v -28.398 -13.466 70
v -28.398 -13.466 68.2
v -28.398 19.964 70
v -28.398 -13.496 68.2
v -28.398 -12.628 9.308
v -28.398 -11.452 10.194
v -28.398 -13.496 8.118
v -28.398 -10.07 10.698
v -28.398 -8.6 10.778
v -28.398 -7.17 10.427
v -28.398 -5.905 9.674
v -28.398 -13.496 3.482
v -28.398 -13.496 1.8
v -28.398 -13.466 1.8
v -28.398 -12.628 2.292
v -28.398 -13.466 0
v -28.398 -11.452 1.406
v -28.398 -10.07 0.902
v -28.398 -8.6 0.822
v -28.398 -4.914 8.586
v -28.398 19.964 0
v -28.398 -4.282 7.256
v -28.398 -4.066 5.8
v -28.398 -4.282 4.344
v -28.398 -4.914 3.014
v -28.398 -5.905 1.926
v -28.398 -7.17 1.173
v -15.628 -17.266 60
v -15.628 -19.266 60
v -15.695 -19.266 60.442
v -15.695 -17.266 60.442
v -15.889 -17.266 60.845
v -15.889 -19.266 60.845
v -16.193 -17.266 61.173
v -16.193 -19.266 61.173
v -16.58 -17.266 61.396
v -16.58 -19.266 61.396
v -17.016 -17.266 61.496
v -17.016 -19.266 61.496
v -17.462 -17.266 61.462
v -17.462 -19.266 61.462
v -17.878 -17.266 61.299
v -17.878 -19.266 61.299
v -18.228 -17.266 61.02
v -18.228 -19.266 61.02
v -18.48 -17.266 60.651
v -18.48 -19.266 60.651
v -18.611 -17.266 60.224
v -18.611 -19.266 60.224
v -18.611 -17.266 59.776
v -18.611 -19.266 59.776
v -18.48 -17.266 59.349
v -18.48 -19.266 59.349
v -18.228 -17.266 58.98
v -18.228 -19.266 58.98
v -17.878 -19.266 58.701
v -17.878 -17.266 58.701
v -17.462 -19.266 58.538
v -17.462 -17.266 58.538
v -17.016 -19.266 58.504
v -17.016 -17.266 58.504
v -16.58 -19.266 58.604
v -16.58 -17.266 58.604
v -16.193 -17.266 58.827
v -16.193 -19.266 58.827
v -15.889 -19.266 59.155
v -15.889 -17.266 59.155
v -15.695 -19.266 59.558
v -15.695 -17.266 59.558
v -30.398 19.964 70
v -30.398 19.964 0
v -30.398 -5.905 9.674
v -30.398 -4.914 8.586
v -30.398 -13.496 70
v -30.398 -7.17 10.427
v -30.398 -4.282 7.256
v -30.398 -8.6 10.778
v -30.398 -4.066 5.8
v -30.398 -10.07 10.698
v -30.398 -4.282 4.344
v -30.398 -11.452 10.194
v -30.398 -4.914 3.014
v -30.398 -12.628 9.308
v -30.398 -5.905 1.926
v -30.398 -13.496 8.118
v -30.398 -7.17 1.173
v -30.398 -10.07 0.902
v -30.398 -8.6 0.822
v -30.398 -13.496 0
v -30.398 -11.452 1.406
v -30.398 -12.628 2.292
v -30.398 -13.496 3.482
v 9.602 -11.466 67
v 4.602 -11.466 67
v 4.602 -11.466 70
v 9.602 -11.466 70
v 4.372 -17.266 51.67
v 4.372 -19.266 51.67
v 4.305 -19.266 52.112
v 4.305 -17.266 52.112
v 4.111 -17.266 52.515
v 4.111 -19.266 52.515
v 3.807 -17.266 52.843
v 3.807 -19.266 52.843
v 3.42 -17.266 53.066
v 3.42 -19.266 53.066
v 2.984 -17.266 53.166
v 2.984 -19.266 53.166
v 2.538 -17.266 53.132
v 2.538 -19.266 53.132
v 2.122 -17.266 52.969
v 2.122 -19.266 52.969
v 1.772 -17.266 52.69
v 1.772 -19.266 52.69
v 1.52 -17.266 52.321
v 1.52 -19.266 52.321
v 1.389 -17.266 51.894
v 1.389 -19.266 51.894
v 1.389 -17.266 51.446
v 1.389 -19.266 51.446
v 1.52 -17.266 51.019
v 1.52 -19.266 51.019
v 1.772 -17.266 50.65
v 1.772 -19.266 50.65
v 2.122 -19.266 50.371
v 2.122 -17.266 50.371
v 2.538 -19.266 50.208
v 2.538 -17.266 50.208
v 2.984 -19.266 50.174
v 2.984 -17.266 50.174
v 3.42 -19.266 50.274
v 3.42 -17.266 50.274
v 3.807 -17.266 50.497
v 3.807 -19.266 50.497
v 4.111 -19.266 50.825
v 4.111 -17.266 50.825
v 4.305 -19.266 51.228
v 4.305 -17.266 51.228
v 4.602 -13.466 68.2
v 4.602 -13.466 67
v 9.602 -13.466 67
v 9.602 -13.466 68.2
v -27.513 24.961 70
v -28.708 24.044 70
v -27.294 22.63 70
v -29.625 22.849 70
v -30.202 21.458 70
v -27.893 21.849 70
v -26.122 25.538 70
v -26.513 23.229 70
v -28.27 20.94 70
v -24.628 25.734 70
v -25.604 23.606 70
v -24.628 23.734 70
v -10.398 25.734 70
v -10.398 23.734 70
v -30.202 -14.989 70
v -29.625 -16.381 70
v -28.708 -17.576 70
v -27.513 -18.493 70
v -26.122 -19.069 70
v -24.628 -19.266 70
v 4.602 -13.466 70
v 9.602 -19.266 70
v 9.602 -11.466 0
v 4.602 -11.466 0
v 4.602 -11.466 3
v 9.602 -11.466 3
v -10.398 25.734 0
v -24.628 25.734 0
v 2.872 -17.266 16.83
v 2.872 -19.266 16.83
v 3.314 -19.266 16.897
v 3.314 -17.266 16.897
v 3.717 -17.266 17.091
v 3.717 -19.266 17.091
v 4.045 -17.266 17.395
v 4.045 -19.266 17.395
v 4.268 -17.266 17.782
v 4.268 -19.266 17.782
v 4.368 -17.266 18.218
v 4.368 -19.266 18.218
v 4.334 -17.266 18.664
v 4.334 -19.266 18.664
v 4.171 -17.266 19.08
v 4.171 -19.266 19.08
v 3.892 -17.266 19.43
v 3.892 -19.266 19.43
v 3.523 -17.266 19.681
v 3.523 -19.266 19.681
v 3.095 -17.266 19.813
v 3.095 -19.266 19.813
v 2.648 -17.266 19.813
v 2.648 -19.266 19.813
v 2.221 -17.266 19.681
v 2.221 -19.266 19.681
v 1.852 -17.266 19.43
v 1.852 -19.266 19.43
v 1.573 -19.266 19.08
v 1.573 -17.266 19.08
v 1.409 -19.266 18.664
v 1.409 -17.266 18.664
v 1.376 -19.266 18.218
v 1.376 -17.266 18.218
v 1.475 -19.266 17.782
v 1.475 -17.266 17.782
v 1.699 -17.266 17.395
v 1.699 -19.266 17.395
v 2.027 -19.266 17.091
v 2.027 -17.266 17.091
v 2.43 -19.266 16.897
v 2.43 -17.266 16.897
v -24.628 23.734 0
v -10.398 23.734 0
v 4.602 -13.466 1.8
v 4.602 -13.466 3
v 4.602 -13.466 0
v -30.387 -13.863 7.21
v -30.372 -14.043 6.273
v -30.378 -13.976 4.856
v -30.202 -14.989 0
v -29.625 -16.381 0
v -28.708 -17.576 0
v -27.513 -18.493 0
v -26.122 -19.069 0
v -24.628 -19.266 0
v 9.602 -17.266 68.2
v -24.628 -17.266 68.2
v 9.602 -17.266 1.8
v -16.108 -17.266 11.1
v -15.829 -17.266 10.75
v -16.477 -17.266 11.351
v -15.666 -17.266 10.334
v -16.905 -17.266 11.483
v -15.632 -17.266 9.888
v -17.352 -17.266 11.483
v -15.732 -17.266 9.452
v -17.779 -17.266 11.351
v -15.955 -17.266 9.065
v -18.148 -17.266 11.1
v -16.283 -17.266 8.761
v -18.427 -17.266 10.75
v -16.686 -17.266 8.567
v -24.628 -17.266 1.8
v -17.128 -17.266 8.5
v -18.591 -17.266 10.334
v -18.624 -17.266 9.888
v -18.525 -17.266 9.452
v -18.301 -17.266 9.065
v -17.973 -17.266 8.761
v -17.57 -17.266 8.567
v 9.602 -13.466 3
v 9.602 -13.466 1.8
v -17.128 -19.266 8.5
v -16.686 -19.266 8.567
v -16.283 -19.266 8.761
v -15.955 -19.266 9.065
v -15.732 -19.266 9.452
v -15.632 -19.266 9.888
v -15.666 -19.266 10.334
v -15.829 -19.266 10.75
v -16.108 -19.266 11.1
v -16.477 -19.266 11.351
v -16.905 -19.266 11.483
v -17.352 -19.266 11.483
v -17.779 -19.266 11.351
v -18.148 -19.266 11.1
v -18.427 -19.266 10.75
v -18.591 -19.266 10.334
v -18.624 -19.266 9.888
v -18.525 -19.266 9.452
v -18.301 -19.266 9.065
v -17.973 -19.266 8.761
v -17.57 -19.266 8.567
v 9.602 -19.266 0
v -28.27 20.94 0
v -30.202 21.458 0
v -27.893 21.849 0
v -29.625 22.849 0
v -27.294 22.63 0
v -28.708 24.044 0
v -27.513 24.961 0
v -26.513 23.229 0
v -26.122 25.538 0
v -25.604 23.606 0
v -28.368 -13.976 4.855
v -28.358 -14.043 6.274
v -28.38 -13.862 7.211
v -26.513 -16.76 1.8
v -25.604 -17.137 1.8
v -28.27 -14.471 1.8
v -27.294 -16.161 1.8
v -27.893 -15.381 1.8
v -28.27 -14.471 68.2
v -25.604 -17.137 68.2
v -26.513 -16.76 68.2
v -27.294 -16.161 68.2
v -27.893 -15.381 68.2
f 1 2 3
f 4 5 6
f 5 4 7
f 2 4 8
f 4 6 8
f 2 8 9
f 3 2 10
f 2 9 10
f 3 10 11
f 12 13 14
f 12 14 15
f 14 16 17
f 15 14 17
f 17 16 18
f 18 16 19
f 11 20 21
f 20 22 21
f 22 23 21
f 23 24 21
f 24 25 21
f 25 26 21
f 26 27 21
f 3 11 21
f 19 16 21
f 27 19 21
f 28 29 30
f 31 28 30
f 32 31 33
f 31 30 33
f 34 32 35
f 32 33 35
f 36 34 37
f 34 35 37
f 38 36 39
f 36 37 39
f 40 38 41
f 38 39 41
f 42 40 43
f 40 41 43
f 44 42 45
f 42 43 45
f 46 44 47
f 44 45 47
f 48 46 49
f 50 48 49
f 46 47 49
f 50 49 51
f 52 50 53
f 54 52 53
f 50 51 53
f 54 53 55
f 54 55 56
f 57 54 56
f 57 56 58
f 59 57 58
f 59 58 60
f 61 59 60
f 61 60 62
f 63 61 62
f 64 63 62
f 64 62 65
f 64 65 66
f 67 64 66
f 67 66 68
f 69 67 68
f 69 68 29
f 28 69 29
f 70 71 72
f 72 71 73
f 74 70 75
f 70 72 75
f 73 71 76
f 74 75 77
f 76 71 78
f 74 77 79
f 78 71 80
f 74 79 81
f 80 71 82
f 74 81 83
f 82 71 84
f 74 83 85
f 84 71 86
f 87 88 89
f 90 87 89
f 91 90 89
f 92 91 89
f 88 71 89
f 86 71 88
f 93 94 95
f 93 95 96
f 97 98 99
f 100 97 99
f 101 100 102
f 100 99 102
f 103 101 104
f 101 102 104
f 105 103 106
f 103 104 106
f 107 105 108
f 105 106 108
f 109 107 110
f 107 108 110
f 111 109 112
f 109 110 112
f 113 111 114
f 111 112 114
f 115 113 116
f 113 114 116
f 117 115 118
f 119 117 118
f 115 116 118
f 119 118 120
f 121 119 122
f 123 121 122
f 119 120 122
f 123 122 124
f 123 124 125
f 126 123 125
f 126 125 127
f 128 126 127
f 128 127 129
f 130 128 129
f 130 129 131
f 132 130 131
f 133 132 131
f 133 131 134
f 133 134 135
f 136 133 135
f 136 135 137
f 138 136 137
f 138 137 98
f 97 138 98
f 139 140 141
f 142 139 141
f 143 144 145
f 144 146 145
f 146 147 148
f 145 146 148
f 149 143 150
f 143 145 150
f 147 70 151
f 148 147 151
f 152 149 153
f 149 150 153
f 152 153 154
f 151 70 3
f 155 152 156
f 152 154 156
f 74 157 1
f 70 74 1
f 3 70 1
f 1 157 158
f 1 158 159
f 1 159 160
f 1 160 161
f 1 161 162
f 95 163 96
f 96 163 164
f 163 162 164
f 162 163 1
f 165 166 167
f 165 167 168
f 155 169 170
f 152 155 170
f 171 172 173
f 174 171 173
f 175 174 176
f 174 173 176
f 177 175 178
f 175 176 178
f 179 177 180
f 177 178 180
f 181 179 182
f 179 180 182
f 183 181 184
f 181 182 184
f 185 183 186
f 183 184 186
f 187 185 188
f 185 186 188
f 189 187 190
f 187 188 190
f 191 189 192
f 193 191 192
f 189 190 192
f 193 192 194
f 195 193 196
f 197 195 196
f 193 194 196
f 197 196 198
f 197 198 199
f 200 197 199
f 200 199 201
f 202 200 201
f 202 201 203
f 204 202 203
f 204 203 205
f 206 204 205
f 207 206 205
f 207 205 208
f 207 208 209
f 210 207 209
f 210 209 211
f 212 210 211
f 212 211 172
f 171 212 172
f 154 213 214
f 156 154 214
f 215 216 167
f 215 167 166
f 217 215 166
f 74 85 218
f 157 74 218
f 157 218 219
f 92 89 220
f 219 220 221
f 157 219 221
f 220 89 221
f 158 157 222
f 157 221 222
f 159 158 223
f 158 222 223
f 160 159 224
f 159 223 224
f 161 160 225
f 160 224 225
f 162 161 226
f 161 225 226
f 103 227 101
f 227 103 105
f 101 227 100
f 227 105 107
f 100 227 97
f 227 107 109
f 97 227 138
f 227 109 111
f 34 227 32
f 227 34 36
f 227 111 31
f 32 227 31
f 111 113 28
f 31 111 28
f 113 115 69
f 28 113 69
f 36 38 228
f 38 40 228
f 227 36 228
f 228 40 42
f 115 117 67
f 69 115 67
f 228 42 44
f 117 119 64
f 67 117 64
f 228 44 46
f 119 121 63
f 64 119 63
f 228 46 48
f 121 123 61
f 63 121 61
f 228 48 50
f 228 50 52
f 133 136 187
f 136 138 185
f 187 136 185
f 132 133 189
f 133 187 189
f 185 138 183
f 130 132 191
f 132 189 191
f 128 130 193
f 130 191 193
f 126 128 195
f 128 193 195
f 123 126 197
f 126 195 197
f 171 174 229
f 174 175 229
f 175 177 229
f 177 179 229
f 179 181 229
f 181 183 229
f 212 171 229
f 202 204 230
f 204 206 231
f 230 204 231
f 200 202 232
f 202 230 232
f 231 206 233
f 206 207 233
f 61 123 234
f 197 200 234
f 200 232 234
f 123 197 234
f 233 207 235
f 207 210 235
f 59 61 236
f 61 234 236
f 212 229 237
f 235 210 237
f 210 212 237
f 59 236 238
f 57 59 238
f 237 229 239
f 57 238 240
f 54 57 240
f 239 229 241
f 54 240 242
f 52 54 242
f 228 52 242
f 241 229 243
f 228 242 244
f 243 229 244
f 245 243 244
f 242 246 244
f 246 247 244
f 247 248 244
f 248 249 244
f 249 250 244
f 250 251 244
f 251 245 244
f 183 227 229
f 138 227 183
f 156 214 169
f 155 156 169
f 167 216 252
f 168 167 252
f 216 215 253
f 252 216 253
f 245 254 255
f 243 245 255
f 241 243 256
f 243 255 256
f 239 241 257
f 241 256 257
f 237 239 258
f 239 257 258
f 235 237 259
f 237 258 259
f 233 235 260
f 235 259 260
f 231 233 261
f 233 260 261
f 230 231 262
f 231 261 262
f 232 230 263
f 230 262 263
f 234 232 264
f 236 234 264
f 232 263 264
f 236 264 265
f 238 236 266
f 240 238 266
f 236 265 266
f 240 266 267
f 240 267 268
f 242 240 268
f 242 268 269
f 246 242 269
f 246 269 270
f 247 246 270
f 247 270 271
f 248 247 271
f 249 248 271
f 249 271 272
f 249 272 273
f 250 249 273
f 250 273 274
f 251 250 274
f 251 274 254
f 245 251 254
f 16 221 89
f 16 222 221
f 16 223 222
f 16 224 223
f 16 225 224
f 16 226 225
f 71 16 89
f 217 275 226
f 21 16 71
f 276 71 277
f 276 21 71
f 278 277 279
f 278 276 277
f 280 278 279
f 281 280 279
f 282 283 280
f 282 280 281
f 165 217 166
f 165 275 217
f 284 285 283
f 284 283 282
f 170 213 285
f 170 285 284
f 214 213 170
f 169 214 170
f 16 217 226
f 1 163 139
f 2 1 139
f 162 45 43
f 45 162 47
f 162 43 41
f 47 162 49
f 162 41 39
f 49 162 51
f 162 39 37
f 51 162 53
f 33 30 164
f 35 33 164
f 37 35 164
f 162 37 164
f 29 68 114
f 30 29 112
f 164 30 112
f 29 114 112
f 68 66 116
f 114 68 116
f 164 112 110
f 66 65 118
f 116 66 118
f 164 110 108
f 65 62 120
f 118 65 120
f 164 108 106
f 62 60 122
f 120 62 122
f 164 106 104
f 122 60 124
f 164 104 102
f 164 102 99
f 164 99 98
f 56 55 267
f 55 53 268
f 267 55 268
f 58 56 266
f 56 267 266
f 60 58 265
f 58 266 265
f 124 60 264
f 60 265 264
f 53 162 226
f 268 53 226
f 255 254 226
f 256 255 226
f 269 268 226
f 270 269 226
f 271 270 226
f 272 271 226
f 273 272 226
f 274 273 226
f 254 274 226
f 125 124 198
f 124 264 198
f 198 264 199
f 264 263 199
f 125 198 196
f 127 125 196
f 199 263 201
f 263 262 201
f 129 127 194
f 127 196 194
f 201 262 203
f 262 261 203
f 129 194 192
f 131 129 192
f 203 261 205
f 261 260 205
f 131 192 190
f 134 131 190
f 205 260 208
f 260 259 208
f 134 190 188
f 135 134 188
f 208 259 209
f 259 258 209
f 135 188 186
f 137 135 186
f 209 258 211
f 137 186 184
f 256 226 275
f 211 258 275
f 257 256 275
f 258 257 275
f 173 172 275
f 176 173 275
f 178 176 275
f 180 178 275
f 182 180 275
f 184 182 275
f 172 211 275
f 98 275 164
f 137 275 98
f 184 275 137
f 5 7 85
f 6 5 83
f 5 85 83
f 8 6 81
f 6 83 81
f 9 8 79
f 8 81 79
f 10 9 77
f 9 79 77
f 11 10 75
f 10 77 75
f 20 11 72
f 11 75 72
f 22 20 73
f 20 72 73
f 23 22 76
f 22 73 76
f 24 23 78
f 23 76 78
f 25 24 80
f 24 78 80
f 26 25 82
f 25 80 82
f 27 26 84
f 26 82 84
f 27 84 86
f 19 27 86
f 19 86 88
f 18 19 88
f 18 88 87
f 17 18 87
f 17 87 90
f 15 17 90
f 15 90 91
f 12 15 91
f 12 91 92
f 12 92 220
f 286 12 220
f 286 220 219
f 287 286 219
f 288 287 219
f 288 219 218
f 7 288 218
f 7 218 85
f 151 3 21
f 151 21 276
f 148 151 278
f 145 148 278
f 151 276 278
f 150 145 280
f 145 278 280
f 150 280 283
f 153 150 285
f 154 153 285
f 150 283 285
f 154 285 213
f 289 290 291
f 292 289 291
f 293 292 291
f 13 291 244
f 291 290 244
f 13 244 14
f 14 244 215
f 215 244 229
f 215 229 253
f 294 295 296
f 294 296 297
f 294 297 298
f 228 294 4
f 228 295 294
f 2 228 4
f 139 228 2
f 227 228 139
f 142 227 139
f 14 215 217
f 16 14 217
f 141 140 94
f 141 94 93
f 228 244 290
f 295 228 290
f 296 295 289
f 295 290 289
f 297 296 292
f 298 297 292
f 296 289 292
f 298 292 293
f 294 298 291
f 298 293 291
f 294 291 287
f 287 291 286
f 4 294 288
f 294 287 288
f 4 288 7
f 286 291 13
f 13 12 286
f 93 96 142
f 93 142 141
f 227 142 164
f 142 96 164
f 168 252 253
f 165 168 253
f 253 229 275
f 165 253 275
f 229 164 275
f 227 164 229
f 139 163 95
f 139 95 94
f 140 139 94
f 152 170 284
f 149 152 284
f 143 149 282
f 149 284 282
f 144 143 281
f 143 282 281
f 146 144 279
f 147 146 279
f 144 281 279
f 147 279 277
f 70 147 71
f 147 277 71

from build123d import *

# Parameters (mm, degrees)
BOSS_EXTRUDE1_DEPTH = 70
BOSS_EXTRUDE3_REACH = 86.63
SKETCH3_W           = 1.8
SKETCH3_H           = 3.8
SKETCH4_W           = 5
SKETCH4_H           = 3
BOSS_EXTRUDE4_DEPTH = 2
CUT_EXTRUDE1_REACH  = 90.595
SKETCH5_R           = 1.5
CUT_EXTRUDE2_REACH  = 86.63
SKETCH6_R           = 5


with BuildPart() as part:
    # Sketch1 → Boss-Extrude1 (new body)
    with BuildSketch(Plane.XY):
        with BuildLine():
            Line((-30.398230088, 19.964424779), (-30.398230088, -13.495575221))
            ThreePointArc((-30.398230088, -13.495575221), (-28.708236216, -17.575581349), (-24.628230088, -19.265575221))
            Line((-24.628230088, -19.265575221), (9.601769912, -19.265575221))
            Line((9.601769912, -19.265575221), (9.601769912, -17.265575221))
            Line((9.601769912, -17.265575221), (-24.628230088, -17.265575221))
            ThreePointArc((-24.628230088, -17.265575221), (-27.294022654, -16.161367786), (-28.398230088, -13.495575221))
            Line((-28.398230088, -13.495575221), (-28.398230088, 19.964424779))
            ThreePointArc((-28.398230088, 19.964424779), (-27.294022654, 22.630217344), (-24.628230088, 23.734424779))
            Line((-24.628230088, 23.734424779), (-10.398230088, 23.734424779))
            Line((-10.398230088, 23.734424779), (-10.398230088, 25.734424779))
            Line((-10.398230088, 25.734424779), (-24.628230088, 25.734424779))
            ThreePointArc((-24.628230088, 25.734424779), (-28.708236216, 24.044430906), (-30.398230088, 19.964424779))
        make_face()
    extrude(amount=BOSS_EXTRUDE1_DEPTH)

    # Sketch3 → Boss-Extrude3 (add, up to next)
    with BuildSketch(Plane(origin=(9.601769912, 0, 0), x_dir=(0, 0, -1), z_dir=(1, 0, 0)), mode=Mode.PRIVATE) as boss_extrude3_sk1:
        with Locations((-69.1, -15.365575221)):
            Rectangle(SKETCH3_W, SKETCH3_H)
    boss_extrude3_tool1 = extrude(boss_extrude3_sk1.sketch, amount=-BOSS_EXTRUDE3_REACH, mode=Mode.PRIVATE) - part.part
    # Sketch3 → Boss-Extrude3 (add, up to next)
    with BuildSketch(Plane(origin=(9.601769912, 0, 0), x_dir=(0, 0, -1), z_dir=(1, 0, 0)), mode=Mode.PRIVATE) as boss_extrude3_sk2:
        with Locations((-0.9, -15.365575221)):
            Rectangle(SKETCH3_W, SKETCH3_H)
    boss_extrude3_tool2 = extrude(boss_extrude3_sk2.sketch, amount=-BOSS_EXTRUDE3_REACH, mode=Mode.PRIVATE) - part.part
    add(boss_extrude3_tool1.solids().sort_by_distance((9.60177, -15.365575, 69.1))[0])
    add(boss_extrude3_tool2.solids().sort_by_distance((9.60177, -15.365575, 0.9))[0])

    # Sketch4 → Boss-Extrude4 (add)
    with BuildSketch(Plane(origin=(0, -13.465575221, 0), x_dir=(1, 0, 0), z_dir=(0, 1, 0))):
        with Locations((7.101769912, -68.5)):
            Rectangle(SKETCH4_W, SKETCH4_H)
        with Locations((7.101769912, -1.5)):
            Rectangle(SKETCH4_W, SKETCH4_H)
    extrude(amount=BOSS_EXTRUDE4_DEPTH)

    # Sketch5 → Cut-Extrude1 (cut, up to next)
    with BuildSketch(Plane(origin=(0, -19.265575221, 0), x_dir=(-1, 0, 0), z_dir=(0, -1, 0)), mode=Mode.PRIVATE) as cut_extrude1_sk1:
        with Locations(Location((17.128230088, -60, 0), (0, 0, 180))):
            Circle(SKETCH5_R)
    cut_extrude1_tool1 = extrude(cut_extrude1_sk1.sketch, amount=-CUT_EXTRUDE1_REACH, mode=Mode.PRIVATE) & part.part
    # Sketch5 → Cut-Extrude1 (cut, up to next)
    with BuildSketch(Plane(origin=(0, -19.265575221, 0), x_dir=(-1, 0, 0), z_dir=(0, -1, 0)), mode=Mode.PRIVATE) as cut_extrude1_sk2:
        with Locations(Location((17.128230088, -10, 0), (0, 0, 90))):
            Circle(SKETCH5_R)
    cut_extrude1_tool2 = extrude(cut_extrude1_sk2.sketch, amount=-CUT_EXTRUDE1_REACH, mode=Mode.PRIVATE) & part.part
    # Sketch5 → Cut-Extrude1 (cut, up to next)
    with BuildSketch(Plane(origin=(0, -19.265575221, 0), x_dir=(-1, 0, 0), z_dir=(0, -1, 0)), mode=Mode.PRIVATE) as cut_extrude1_sk3:
        with Locations(Location((-2.871769912, -51.67, 0), (0, 0, 180))):
            Circle(SKETCH5_R)
    cut_extrude1_tool3 = extrude(cut_extrude1_sk3.sketch, amount=-CUT_EXTRUDE1_REACH, mode=Mode.PRIVATE) & part.part
    # Sketch5 → Cut-Extrude1 (cut, up to next)
    with BuildSketch(Plane(origin=(0, -19.265575221, 0), x_dir=(-1, 0, 0), z_dir=(0, -1, 0)), mode=Mode.PRIVATE) as cut_extrude1_sk4:
        with Locations(Location((-2.871769912, -18.33, 0), (0, 0, 90))):
            Circle(SKETCH5_R)
    cut_extrude1_tool4 = extrude(cut_extrude1_sk4.sketch, amount=-CUT_EXTRUDE1_REACH, mode=Mode.PRIVATE) & part.part
    add(cut_extrude1_tool1.solids().sort_by_distance((-17.12823, -19.265575, 60))[0], mode=Mode.SUBTRACT)
    add(cut_extrude1_tool2.solids().sort_by_distance((-17.12823, -19.265575, 10))[0], mode=Mode.SUBTRACT)
    add(cut_extrude1_tool3.solids().sort_by_distance((2.87177, -19.265575, 51.67))[0], mode=Mode.SUBTRACT)
    add(cut_extrude1_tool4.solids().sort_by_distance((2.87177, -19.265575, 18.33))[0], mode=Mode.SUBTRACT)

    # Sketch6 → Cut-Extrude2 (cut, up to next)
    with BuildSketch(Plane.ZY.offset(30.398230088), mode=Mode.PRIVATE) as cut_extrude2_sk1:
        with Locations(Location((5.8, -9.065575221, 0), (0, 0, 297.625166054))):
            Circle(SKETCH6_R)
    cut_extrude2_tool1 = extrude(cut_extrude2_sk1.sketch, amount=-CUT_EXTRUDE2_REACH, mode=Mode.PRIVATE) & part.part
    add(cut_extrude2_tool1.solids().sort_by_distance((-30.39823, -9.065575, 5.8))[0], mode=Mode.SUBTRACT)


solid = part.part
